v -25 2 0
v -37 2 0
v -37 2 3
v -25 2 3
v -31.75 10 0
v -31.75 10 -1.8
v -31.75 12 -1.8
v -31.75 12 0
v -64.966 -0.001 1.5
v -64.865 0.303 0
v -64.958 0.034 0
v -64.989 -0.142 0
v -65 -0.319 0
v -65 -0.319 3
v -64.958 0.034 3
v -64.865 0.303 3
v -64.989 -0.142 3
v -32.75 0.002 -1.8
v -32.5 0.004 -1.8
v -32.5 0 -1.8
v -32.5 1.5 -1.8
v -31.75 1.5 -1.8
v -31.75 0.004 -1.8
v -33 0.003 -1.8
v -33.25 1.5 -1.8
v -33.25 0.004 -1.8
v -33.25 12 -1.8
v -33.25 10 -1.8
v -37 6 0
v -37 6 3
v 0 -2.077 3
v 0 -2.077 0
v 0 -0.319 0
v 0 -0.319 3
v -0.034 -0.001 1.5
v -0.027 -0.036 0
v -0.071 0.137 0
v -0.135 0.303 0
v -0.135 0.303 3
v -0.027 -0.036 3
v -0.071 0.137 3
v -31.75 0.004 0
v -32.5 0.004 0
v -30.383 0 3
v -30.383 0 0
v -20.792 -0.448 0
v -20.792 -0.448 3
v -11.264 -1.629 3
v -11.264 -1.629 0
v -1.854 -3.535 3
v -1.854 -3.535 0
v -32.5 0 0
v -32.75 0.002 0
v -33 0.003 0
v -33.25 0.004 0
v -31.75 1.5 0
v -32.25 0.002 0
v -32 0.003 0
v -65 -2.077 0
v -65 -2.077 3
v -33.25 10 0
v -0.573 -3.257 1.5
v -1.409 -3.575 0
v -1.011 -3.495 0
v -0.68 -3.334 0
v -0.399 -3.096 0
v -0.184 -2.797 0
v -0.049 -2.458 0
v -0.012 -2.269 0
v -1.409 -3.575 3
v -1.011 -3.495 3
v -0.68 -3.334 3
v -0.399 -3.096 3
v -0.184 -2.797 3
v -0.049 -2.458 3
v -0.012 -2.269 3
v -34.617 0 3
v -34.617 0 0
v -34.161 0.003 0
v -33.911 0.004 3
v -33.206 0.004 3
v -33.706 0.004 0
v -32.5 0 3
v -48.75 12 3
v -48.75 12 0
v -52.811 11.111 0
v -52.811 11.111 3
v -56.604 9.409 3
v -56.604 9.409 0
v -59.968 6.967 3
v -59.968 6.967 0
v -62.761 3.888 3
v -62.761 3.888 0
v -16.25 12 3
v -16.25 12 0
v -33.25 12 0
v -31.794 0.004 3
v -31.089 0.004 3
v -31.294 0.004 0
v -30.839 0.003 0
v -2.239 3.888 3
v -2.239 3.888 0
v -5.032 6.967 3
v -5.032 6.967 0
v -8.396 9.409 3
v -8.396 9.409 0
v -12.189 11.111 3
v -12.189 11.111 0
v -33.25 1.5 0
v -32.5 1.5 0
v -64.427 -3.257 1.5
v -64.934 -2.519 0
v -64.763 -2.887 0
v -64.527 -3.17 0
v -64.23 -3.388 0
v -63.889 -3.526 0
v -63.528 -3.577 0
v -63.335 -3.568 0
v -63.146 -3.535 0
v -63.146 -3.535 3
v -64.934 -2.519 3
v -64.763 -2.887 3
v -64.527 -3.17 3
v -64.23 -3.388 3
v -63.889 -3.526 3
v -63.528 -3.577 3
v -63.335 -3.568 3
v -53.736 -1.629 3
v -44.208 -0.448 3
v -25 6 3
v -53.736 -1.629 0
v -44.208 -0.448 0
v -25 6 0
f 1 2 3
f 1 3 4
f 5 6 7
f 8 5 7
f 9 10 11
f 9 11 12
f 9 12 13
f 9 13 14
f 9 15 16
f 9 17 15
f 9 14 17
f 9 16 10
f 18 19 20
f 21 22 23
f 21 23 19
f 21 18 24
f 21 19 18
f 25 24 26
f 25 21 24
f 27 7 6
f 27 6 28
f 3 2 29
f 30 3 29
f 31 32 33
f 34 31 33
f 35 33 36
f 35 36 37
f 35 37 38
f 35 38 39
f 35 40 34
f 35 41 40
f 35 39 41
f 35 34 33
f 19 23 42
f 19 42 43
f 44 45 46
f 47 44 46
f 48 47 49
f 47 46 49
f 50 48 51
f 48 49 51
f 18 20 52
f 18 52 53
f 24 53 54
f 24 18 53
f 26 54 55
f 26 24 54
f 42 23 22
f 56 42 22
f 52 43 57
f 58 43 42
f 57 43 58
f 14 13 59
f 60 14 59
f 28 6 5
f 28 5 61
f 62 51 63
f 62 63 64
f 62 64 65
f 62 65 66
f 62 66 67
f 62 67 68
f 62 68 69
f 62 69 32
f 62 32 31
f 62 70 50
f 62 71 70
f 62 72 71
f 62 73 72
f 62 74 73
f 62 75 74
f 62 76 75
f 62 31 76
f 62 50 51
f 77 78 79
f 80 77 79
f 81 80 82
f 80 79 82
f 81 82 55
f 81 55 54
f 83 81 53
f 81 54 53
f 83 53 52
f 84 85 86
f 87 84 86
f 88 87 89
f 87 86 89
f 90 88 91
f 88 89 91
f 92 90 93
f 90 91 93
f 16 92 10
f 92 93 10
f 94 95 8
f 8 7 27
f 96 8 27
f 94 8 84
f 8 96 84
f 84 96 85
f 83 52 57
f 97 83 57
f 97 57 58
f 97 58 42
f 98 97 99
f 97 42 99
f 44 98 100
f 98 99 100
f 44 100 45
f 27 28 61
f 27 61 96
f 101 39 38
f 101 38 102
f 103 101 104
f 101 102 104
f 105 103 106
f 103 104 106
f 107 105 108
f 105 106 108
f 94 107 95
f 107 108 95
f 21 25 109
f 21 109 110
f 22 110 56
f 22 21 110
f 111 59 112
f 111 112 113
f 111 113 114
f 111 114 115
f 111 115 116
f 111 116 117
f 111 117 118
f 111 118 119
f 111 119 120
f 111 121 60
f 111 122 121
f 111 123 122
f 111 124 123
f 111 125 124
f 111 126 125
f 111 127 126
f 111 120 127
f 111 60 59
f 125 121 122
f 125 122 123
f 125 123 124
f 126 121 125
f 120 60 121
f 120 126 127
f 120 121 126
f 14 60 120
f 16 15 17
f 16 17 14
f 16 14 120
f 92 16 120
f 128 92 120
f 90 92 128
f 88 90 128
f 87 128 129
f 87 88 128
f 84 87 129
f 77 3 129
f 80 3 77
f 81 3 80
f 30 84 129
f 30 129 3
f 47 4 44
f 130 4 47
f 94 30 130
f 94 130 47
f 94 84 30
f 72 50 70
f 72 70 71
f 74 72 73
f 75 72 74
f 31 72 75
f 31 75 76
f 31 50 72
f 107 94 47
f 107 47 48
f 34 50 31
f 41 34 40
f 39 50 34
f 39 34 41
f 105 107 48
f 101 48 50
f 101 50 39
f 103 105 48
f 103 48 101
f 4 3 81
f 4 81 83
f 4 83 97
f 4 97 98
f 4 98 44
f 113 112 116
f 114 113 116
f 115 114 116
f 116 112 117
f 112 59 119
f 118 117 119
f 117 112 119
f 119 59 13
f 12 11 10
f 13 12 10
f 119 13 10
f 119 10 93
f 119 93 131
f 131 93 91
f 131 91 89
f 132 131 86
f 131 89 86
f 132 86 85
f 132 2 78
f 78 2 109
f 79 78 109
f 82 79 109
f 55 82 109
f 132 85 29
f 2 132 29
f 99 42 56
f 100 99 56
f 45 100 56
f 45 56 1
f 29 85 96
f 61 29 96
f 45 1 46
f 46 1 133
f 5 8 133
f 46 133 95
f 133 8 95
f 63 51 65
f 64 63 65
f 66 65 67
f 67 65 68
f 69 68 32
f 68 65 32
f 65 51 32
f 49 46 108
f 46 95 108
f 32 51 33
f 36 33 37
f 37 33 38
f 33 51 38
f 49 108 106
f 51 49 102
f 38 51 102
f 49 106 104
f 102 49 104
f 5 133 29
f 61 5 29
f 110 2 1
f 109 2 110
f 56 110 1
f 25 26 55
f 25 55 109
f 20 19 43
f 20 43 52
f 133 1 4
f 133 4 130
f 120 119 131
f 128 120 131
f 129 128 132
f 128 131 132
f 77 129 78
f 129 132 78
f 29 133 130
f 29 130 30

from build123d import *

# Parameters (mm, degrees)
BOSS_EXTRUDE1_DEPTH     = 3
CUT_EXTRUDE1_DEPTH      = 67.166456759
CUT_EXTRUDE1_DEPTH_BACK = 67.166456759
SKETCH2_W               = 12
SKETCH2_H               = 4
VARFILLET1_R            = 1.5
BOSS_EXTRUDE2_START     = 1.8
SKETCH3_W               = 1.49997773
SKETCH3_H               = 2
BOSS_EXTRUDE2_DEPTH     = 1.8


with BuildPart() as part:
    # Sketch1 → Boss-Extrude1 (new body)
    with BuildSketch(Plane.XY):
        with BuildLine():
            Line((0, -4), (0, 0))
            ThreePointArc((0, 0), (-6.517304845, 8.177087189), (-16.25, 12))
            Line((-16.25, 12), (-48.75, 12))
            ThreePointArc((-48.75, 12), (-58.482695155, 8.177087189), (-65, 0))
            Line((-65, 0), (-65, -4))
            ThreePointArc((-65, -4), (-48.881086926, -0.934918729), (-32.5, 0))
            ThreePointArc((-32.5, 0), (-16.118913074, -0.934918729), (0, -4))
        make_face()
    extrude(amount=BOSS_EXTRUDE1_DEPTH)

    # Sketch2 → Cut-Extrude1 (cut, two sides: drawn at the far end of the back side and taken through both)
    with BuildSketch(Plane.XY.offset(3).offset(-CUT_EXTRUDE1_DEPTH_BACK)):
        with Locations((-31, 4)):
            Rectangle(SKETCH2_W, SKETCH2_H)
    extrude(amount=CUT_EXTRUDE1_DEPTH + CUT_EXTRUDE1_DEPTH_BACK, mode=Mode.SUBTRACT)

    # VarFillet1
    varfillet1_edges = [part.edges().sort_by_distance(p)[0] for p in [
        (-65, -4, 1.5),
        (-65, 0, 1.5),
        (0, -4, 1.5),
        (0, 0, 1.5),
    ]]
    fillet(varfillet1_edges, radius=VARFILLET1_R)

    # Sketch3 → Boss-Extrude2 (add)
    with BuildSketch(Plane(origin=(0, 0, 0), x_dir=(-1, 0, 0), z_dir=(0, 0, -1)).offset(BOSS_EXTRUDE2_START)):
        with BuildLine():
            Line((32.5, 0.004086765), (32.5, 0))
            ThreePointArc((32.5, 0), (32.874991378, 0.002603923), (33.249988865, 0.004086765))
            Line((33.249988865, 0.004086765), (33.249988865, 1.5))
            Line((33.249988865, 1.5), (31.750011135, 1.5))
            Line((31.750011135, 1.5), (31.750011135, 0.004086765))
            Line((31.750011135, 0.004086765), (32.5, 0.004086765))
        make_face()
        with Locations((32.5, 11)):
            Rectangle(SKETCH3_W, SKETCH3_H)
    extrude(amount=-BOSS_EXTRUDE2_DEPTH)


solid = part.part
